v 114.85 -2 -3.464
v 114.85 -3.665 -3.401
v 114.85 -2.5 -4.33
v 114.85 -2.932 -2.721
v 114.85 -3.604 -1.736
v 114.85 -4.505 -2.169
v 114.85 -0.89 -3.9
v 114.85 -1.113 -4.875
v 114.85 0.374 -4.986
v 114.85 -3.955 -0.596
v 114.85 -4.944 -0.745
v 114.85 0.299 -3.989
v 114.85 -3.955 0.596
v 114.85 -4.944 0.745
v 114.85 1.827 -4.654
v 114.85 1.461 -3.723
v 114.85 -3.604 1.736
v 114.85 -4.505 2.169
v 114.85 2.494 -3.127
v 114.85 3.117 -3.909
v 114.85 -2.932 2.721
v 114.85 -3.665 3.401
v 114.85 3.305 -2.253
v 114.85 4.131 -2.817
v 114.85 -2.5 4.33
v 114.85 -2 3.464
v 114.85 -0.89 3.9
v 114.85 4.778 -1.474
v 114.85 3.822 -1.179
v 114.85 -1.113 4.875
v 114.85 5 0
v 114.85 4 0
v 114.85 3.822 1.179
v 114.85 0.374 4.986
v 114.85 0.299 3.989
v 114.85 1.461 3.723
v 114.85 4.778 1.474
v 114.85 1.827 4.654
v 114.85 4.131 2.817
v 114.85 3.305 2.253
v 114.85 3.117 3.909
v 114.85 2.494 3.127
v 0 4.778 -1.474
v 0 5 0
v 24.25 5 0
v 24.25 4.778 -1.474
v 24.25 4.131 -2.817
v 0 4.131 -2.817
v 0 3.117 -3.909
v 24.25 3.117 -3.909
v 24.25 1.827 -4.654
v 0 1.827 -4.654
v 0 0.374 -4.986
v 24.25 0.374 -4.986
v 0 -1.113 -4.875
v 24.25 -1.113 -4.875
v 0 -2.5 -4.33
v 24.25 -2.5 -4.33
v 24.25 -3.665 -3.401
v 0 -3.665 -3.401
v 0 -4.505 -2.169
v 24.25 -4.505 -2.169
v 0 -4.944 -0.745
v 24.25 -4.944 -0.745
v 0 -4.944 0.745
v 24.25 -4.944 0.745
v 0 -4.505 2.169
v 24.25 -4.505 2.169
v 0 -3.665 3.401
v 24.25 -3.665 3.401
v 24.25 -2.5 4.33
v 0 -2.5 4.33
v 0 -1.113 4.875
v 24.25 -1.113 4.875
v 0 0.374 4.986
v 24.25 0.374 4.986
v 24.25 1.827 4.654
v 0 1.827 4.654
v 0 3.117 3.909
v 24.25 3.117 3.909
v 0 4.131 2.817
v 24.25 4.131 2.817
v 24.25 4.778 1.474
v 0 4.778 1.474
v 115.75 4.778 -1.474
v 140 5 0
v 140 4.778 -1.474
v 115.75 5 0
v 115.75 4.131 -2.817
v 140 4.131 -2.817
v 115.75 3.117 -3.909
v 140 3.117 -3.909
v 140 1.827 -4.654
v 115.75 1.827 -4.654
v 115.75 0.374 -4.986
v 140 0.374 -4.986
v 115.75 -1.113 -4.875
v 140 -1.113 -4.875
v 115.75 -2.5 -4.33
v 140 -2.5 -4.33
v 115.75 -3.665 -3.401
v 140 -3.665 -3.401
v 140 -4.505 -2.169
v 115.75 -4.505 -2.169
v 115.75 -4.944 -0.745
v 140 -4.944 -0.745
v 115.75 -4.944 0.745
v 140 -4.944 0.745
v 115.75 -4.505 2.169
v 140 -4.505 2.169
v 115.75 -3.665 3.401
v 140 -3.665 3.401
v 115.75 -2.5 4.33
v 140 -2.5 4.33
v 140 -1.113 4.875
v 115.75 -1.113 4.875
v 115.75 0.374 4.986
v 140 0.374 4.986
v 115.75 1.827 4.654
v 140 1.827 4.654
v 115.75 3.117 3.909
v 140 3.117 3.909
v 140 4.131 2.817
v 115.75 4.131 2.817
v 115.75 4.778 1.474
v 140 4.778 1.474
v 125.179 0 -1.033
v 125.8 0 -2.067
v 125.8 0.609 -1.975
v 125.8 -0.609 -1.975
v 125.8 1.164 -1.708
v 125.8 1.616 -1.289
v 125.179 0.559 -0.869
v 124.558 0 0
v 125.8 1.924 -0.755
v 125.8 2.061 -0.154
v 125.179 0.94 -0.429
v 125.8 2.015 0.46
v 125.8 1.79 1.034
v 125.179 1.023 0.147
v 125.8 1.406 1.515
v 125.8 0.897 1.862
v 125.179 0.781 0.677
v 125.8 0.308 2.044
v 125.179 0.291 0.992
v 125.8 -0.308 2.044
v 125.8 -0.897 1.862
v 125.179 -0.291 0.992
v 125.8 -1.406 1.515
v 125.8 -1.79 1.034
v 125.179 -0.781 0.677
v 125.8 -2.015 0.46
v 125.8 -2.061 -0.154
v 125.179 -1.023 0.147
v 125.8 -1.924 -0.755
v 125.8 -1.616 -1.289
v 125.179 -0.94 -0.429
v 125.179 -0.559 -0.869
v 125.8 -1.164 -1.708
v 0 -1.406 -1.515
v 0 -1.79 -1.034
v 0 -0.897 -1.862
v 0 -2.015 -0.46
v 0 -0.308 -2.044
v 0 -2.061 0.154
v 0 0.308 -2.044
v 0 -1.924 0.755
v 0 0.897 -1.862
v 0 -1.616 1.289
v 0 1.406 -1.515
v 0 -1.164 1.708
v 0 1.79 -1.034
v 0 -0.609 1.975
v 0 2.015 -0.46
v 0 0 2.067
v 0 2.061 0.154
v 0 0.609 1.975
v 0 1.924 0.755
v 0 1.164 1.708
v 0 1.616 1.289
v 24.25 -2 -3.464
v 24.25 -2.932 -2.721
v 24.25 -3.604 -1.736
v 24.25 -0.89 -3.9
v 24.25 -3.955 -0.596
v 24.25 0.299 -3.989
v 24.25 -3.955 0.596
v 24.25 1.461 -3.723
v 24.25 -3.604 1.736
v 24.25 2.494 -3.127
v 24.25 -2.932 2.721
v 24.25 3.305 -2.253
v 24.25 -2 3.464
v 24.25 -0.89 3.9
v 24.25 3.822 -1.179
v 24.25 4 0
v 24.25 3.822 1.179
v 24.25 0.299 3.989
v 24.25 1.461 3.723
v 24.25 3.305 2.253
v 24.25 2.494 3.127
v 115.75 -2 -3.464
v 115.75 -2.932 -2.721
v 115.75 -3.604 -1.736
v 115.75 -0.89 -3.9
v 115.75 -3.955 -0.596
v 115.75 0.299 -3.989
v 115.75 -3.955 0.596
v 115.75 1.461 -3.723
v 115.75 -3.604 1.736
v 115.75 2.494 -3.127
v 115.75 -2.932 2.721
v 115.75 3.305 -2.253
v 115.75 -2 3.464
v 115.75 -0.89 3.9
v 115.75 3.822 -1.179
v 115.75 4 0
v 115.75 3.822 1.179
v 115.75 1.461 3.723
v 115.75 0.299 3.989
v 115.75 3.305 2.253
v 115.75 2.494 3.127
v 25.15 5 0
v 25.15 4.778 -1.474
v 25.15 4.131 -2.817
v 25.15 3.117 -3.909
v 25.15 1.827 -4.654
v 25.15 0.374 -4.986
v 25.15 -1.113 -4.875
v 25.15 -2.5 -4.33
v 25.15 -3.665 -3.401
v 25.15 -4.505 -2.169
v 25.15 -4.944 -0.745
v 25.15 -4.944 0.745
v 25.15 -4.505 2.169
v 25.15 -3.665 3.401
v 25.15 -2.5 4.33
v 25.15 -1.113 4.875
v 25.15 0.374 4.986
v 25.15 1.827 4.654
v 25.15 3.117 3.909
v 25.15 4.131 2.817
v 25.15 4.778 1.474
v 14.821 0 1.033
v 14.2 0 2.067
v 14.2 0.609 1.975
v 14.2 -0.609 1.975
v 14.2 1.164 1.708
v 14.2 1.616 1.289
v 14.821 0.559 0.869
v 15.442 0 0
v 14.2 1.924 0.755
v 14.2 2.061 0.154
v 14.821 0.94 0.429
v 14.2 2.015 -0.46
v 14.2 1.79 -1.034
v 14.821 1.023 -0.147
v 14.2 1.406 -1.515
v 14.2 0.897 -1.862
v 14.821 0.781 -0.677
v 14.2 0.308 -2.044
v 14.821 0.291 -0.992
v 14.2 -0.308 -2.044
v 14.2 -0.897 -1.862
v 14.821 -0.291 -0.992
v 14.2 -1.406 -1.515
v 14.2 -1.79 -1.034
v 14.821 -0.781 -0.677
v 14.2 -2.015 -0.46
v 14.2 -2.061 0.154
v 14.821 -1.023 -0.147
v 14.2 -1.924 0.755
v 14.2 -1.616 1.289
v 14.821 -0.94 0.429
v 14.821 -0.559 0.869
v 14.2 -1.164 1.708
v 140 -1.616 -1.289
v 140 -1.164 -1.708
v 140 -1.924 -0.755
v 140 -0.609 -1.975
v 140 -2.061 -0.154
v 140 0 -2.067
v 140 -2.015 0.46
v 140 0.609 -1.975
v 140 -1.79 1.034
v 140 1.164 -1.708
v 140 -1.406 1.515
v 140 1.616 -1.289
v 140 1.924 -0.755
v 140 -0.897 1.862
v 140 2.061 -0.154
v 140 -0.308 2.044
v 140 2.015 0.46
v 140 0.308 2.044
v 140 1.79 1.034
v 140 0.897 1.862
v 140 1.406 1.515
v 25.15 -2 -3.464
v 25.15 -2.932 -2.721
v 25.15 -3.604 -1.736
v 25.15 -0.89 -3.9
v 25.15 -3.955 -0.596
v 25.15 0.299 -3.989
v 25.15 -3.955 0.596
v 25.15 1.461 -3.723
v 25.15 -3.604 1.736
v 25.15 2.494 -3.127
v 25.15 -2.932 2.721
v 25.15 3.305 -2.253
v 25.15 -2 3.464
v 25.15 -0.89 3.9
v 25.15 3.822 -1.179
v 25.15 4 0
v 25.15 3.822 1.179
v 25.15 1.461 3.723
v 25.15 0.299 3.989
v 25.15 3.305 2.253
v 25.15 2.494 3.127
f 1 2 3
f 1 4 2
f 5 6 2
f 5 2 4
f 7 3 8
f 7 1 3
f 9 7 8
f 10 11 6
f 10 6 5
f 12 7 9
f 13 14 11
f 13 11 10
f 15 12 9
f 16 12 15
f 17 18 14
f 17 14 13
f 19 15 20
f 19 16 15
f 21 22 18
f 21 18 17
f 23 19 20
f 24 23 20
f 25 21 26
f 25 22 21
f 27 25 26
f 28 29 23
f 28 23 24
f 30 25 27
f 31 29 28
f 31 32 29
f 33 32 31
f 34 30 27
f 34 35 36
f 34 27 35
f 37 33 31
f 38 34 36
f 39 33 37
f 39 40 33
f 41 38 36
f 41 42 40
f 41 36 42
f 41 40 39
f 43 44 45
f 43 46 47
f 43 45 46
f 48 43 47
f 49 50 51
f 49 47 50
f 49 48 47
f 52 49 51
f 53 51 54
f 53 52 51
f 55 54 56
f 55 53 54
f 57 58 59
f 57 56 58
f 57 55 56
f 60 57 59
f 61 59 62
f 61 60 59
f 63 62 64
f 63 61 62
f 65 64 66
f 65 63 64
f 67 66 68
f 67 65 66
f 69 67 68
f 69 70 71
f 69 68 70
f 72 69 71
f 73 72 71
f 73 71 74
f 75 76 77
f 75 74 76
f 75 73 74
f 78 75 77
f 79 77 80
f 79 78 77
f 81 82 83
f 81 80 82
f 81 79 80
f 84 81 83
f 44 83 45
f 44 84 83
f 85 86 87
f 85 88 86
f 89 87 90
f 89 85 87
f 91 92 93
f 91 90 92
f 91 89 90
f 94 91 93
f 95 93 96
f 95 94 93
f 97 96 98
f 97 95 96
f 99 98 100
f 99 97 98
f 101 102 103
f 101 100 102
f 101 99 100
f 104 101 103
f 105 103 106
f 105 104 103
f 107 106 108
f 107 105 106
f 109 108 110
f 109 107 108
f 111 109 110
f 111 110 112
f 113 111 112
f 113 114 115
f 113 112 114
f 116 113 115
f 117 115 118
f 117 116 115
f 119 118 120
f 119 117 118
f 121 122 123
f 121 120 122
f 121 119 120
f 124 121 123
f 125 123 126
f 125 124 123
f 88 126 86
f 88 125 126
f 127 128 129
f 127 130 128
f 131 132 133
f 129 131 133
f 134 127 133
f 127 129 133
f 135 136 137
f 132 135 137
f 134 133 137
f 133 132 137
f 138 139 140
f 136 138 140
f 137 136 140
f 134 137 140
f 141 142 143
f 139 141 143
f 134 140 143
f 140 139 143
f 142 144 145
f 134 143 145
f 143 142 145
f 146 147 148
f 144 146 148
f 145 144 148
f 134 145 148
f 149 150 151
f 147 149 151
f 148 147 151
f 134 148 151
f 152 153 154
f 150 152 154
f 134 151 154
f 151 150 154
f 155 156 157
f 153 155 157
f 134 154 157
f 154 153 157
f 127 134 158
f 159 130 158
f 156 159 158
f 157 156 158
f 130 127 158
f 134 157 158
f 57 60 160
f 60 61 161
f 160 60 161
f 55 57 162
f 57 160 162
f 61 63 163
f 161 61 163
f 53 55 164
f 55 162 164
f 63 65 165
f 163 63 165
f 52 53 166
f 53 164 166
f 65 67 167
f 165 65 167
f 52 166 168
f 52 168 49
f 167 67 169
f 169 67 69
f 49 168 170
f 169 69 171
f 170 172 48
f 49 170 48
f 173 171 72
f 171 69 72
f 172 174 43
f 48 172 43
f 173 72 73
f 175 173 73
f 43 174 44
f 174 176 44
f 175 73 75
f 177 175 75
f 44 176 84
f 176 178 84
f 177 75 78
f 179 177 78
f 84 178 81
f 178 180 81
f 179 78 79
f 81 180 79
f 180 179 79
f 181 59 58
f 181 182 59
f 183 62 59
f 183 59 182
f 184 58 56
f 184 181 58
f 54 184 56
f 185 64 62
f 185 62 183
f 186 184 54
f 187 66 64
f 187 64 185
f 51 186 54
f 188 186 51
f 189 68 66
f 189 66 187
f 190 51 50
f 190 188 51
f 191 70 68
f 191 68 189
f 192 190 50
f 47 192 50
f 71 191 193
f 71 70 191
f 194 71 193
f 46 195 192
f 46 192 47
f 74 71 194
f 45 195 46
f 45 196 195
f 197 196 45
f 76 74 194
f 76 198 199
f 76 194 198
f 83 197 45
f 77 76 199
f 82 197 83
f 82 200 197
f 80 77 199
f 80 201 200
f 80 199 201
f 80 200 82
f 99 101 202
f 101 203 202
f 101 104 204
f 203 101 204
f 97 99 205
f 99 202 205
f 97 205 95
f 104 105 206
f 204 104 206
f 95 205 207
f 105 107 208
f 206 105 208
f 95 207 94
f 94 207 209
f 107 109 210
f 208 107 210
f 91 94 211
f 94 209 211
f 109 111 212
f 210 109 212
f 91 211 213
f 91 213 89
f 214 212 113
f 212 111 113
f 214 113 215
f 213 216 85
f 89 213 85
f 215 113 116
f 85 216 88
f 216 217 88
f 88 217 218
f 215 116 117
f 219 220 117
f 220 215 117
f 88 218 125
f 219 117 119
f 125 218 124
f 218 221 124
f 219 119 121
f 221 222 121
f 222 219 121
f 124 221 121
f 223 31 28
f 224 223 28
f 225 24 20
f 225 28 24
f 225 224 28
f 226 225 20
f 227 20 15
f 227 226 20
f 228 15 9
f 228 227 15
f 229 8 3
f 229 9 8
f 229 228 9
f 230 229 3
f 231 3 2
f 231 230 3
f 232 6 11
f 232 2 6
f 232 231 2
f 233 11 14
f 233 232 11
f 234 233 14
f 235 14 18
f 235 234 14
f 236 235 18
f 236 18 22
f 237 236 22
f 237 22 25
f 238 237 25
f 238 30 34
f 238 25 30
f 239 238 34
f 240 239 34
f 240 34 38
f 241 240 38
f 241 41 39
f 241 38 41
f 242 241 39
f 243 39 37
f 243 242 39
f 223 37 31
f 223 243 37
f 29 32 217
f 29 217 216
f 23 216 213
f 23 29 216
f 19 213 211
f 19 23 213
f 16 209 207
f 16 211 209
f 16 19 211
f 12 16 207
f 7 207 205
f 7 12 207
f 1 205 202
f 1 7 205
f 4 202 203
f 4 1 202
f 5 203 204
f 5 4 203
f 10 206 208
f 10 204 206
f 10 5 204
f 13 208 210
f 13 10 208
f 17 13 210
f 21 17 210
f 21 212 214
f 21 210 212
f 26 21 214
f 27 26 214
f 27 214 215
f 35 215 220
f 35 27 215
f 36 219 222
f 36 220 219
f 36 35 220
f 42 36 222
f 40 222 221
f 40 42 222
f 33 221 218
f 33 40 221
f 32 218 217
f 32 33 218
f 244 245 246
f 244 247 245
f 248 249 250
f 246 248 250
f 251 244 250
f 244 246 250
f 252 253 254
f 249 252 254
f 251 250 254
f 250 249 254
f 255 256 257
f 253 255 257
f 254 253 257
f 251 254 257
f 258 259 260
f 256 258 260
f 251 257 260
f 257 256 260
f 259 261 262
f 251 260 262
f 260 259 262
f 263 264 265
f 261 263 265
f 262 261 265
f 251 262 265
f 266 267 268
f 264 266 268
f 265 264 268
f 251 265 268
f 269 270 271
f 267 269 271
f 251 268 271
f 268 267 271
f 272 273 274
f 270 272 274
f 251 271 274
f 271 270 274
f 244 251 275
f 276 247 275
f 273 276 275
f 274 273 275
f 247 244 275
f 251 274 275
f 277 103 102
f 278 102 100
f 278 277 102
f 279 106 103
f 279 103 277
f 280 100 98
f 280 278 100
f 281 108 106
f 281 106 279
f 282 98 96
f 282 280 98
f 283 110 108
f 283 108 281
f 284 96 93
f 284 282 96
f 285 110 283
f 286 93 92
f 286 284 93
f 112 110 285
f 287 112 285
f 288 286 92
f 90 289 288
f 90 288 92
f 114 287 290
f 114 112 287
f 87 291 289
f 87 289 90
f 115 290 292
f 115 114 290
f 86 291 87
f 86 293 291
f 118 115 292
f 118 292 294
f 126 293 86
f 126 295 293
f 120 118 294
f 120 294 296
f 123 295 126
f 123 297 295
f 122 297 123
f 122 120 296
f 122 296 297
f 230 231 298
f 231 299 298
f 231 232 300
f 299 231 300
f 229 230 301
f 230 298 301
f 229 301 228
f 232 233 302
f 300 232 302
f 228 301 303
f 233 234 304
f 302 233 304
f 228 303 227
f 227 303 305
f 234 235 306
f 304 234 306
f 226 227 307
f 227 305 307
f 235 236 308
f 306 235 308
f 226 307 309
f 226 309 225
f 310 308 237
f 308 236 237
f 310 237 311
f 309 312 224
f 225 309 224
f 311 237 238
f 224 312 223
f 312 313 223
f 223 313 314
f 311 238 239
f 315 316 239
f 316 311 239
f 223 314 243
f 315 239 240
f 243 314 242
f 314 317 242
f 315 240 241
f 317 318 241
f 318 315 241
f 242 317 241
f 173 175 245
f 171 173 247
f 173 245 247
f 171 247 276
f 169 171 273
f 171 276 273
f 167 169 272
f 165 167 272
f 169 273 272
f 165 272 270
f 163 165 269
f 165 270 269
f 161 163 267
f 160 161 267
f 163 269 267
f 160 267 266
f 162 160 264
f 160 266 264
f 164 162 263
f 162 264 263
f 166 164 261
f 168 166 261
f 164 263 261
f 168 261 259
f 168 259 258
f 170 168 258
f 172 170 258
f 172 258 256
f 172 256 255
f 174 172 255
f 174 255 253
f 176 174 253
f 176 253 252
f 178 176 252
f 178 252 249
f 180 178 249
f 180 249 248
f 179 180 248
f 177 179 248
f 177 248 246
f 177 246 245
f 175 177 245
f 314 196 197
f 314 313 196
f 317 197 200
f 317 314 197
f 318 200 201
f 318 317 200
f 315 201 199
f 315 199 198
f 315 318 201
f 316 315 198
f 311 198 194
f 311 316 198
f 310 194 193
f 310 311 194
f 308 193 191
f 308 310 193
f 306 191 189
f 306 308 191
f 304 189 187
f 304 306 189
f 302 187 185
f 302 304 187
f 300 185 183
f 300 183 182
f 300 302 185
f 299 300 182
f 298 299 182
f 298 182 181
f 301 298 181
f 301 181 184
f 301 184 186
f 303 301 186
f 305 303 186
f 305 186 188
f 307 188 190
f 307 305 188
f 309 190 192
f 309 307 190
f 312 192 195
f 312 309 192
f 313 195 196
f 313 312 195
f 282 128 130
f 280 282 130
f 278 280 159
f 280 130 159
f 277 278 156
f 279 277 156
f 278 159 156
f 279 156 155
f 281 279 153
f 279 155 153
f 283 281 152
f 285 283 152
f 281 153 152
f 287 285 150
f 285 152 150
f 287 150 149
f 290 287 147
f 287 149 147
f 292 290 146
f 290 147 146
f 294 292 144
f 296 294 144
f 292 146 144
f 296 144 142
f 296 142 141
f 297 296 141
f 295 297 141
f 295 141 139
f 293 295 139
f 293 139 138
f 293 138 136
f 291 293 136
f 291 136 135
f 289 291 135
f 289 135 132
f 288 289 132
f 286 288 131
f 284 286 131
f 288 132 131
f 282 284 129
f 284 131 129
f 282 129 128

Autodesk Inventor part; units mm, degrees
ref_plane "YZ Plane" through (0, 0, 0) normal (1, 0, 0) x (0, 1, 0)
sketch "Skizze1" plane through (0, 0, 0) normal (1, 0, 0) x (0, 1, 0)
  circle A0 centre (0, 0) radius 5
  dimension "d0" = 10
extrude "Extrusion1" add sketch "Skizze1" along normal blind 140
sketch "Skizze2" plane through (0, 0, 0) normal (-1, 0, 0) x (0, 0, 1)
  point P0 (0, 0)
  point P1 (0, 0)
hole "Bohrung1" at (0, 0, 0) direction (1, 0, 0) diameter 4.134 depth 14.2 tip angle 118 thread size "M5x0.8" class "6H" standard "ISO Metric profile"
sketch "Skizze3" plane through (140, 0, 0) normal (1, 0, 0) x (0, 0, -1)
  point P0 (0, 0)
  point P1 (0, 0)
hole "Bohrung2" at (140, 0, 0) direction (-1, 0, 0) diameter 4.134 depth 14.2 tip angle 118 thread size "M5x0.8" class "6H" standard "ISO Metric profile"
sketch "Skizze4" plane through (0, 0, 0) normal (0, 1, 0) x (-1, 0, 0)
  line L0 (0, 0) -> (-70, 0)
  line L1 (-70, 0) -> (-140, 0)
  line L2 (-140, -2.067) -> (-140, 2.067) projected
  line L3 (-70, 0) -> (-114.85, 0)
  line L4 (-70, 0) -> (-25.15, 0)
  dimension "d17" = 70
  dimension "d18" = 70
  dimension "d19" = 44.85
  dimension "d23" = 44.85
ref_plane "Arbeitsebene1" through (114.85, 0, 0) normal (1, 0, 0) x (0, 1, 0)
sketch "Skizze5" plane through (114.85, 0, 0) normal (1, 0, 0) x (0, 1, 0)
  circle A0 centre (0, 0) radius 5
  circle A1 centre (0, 0) radius 4
  dimension "d20" = 8
extrude "Extrusion2" cut sketch "Skizze5" along normal blind 0.9
ref_plane "Arbeitsebene2" through (25.15, 0, 0) normal (1, 0, 0) x (0, 1, 0)
sketch "Skizze6" plane through (25.15, 0, 0) normal (1, 0, 0) x (0, 1, 0)
  circle A0 centre (0, 0) radius 5
  circle A1 centre (0, 0) radius 4
  dimension "d24" = 8
extrude "Extrusion3" cut sketch "Skizze6" against normal blind 0.9
properties part number "Auspressrolle"
